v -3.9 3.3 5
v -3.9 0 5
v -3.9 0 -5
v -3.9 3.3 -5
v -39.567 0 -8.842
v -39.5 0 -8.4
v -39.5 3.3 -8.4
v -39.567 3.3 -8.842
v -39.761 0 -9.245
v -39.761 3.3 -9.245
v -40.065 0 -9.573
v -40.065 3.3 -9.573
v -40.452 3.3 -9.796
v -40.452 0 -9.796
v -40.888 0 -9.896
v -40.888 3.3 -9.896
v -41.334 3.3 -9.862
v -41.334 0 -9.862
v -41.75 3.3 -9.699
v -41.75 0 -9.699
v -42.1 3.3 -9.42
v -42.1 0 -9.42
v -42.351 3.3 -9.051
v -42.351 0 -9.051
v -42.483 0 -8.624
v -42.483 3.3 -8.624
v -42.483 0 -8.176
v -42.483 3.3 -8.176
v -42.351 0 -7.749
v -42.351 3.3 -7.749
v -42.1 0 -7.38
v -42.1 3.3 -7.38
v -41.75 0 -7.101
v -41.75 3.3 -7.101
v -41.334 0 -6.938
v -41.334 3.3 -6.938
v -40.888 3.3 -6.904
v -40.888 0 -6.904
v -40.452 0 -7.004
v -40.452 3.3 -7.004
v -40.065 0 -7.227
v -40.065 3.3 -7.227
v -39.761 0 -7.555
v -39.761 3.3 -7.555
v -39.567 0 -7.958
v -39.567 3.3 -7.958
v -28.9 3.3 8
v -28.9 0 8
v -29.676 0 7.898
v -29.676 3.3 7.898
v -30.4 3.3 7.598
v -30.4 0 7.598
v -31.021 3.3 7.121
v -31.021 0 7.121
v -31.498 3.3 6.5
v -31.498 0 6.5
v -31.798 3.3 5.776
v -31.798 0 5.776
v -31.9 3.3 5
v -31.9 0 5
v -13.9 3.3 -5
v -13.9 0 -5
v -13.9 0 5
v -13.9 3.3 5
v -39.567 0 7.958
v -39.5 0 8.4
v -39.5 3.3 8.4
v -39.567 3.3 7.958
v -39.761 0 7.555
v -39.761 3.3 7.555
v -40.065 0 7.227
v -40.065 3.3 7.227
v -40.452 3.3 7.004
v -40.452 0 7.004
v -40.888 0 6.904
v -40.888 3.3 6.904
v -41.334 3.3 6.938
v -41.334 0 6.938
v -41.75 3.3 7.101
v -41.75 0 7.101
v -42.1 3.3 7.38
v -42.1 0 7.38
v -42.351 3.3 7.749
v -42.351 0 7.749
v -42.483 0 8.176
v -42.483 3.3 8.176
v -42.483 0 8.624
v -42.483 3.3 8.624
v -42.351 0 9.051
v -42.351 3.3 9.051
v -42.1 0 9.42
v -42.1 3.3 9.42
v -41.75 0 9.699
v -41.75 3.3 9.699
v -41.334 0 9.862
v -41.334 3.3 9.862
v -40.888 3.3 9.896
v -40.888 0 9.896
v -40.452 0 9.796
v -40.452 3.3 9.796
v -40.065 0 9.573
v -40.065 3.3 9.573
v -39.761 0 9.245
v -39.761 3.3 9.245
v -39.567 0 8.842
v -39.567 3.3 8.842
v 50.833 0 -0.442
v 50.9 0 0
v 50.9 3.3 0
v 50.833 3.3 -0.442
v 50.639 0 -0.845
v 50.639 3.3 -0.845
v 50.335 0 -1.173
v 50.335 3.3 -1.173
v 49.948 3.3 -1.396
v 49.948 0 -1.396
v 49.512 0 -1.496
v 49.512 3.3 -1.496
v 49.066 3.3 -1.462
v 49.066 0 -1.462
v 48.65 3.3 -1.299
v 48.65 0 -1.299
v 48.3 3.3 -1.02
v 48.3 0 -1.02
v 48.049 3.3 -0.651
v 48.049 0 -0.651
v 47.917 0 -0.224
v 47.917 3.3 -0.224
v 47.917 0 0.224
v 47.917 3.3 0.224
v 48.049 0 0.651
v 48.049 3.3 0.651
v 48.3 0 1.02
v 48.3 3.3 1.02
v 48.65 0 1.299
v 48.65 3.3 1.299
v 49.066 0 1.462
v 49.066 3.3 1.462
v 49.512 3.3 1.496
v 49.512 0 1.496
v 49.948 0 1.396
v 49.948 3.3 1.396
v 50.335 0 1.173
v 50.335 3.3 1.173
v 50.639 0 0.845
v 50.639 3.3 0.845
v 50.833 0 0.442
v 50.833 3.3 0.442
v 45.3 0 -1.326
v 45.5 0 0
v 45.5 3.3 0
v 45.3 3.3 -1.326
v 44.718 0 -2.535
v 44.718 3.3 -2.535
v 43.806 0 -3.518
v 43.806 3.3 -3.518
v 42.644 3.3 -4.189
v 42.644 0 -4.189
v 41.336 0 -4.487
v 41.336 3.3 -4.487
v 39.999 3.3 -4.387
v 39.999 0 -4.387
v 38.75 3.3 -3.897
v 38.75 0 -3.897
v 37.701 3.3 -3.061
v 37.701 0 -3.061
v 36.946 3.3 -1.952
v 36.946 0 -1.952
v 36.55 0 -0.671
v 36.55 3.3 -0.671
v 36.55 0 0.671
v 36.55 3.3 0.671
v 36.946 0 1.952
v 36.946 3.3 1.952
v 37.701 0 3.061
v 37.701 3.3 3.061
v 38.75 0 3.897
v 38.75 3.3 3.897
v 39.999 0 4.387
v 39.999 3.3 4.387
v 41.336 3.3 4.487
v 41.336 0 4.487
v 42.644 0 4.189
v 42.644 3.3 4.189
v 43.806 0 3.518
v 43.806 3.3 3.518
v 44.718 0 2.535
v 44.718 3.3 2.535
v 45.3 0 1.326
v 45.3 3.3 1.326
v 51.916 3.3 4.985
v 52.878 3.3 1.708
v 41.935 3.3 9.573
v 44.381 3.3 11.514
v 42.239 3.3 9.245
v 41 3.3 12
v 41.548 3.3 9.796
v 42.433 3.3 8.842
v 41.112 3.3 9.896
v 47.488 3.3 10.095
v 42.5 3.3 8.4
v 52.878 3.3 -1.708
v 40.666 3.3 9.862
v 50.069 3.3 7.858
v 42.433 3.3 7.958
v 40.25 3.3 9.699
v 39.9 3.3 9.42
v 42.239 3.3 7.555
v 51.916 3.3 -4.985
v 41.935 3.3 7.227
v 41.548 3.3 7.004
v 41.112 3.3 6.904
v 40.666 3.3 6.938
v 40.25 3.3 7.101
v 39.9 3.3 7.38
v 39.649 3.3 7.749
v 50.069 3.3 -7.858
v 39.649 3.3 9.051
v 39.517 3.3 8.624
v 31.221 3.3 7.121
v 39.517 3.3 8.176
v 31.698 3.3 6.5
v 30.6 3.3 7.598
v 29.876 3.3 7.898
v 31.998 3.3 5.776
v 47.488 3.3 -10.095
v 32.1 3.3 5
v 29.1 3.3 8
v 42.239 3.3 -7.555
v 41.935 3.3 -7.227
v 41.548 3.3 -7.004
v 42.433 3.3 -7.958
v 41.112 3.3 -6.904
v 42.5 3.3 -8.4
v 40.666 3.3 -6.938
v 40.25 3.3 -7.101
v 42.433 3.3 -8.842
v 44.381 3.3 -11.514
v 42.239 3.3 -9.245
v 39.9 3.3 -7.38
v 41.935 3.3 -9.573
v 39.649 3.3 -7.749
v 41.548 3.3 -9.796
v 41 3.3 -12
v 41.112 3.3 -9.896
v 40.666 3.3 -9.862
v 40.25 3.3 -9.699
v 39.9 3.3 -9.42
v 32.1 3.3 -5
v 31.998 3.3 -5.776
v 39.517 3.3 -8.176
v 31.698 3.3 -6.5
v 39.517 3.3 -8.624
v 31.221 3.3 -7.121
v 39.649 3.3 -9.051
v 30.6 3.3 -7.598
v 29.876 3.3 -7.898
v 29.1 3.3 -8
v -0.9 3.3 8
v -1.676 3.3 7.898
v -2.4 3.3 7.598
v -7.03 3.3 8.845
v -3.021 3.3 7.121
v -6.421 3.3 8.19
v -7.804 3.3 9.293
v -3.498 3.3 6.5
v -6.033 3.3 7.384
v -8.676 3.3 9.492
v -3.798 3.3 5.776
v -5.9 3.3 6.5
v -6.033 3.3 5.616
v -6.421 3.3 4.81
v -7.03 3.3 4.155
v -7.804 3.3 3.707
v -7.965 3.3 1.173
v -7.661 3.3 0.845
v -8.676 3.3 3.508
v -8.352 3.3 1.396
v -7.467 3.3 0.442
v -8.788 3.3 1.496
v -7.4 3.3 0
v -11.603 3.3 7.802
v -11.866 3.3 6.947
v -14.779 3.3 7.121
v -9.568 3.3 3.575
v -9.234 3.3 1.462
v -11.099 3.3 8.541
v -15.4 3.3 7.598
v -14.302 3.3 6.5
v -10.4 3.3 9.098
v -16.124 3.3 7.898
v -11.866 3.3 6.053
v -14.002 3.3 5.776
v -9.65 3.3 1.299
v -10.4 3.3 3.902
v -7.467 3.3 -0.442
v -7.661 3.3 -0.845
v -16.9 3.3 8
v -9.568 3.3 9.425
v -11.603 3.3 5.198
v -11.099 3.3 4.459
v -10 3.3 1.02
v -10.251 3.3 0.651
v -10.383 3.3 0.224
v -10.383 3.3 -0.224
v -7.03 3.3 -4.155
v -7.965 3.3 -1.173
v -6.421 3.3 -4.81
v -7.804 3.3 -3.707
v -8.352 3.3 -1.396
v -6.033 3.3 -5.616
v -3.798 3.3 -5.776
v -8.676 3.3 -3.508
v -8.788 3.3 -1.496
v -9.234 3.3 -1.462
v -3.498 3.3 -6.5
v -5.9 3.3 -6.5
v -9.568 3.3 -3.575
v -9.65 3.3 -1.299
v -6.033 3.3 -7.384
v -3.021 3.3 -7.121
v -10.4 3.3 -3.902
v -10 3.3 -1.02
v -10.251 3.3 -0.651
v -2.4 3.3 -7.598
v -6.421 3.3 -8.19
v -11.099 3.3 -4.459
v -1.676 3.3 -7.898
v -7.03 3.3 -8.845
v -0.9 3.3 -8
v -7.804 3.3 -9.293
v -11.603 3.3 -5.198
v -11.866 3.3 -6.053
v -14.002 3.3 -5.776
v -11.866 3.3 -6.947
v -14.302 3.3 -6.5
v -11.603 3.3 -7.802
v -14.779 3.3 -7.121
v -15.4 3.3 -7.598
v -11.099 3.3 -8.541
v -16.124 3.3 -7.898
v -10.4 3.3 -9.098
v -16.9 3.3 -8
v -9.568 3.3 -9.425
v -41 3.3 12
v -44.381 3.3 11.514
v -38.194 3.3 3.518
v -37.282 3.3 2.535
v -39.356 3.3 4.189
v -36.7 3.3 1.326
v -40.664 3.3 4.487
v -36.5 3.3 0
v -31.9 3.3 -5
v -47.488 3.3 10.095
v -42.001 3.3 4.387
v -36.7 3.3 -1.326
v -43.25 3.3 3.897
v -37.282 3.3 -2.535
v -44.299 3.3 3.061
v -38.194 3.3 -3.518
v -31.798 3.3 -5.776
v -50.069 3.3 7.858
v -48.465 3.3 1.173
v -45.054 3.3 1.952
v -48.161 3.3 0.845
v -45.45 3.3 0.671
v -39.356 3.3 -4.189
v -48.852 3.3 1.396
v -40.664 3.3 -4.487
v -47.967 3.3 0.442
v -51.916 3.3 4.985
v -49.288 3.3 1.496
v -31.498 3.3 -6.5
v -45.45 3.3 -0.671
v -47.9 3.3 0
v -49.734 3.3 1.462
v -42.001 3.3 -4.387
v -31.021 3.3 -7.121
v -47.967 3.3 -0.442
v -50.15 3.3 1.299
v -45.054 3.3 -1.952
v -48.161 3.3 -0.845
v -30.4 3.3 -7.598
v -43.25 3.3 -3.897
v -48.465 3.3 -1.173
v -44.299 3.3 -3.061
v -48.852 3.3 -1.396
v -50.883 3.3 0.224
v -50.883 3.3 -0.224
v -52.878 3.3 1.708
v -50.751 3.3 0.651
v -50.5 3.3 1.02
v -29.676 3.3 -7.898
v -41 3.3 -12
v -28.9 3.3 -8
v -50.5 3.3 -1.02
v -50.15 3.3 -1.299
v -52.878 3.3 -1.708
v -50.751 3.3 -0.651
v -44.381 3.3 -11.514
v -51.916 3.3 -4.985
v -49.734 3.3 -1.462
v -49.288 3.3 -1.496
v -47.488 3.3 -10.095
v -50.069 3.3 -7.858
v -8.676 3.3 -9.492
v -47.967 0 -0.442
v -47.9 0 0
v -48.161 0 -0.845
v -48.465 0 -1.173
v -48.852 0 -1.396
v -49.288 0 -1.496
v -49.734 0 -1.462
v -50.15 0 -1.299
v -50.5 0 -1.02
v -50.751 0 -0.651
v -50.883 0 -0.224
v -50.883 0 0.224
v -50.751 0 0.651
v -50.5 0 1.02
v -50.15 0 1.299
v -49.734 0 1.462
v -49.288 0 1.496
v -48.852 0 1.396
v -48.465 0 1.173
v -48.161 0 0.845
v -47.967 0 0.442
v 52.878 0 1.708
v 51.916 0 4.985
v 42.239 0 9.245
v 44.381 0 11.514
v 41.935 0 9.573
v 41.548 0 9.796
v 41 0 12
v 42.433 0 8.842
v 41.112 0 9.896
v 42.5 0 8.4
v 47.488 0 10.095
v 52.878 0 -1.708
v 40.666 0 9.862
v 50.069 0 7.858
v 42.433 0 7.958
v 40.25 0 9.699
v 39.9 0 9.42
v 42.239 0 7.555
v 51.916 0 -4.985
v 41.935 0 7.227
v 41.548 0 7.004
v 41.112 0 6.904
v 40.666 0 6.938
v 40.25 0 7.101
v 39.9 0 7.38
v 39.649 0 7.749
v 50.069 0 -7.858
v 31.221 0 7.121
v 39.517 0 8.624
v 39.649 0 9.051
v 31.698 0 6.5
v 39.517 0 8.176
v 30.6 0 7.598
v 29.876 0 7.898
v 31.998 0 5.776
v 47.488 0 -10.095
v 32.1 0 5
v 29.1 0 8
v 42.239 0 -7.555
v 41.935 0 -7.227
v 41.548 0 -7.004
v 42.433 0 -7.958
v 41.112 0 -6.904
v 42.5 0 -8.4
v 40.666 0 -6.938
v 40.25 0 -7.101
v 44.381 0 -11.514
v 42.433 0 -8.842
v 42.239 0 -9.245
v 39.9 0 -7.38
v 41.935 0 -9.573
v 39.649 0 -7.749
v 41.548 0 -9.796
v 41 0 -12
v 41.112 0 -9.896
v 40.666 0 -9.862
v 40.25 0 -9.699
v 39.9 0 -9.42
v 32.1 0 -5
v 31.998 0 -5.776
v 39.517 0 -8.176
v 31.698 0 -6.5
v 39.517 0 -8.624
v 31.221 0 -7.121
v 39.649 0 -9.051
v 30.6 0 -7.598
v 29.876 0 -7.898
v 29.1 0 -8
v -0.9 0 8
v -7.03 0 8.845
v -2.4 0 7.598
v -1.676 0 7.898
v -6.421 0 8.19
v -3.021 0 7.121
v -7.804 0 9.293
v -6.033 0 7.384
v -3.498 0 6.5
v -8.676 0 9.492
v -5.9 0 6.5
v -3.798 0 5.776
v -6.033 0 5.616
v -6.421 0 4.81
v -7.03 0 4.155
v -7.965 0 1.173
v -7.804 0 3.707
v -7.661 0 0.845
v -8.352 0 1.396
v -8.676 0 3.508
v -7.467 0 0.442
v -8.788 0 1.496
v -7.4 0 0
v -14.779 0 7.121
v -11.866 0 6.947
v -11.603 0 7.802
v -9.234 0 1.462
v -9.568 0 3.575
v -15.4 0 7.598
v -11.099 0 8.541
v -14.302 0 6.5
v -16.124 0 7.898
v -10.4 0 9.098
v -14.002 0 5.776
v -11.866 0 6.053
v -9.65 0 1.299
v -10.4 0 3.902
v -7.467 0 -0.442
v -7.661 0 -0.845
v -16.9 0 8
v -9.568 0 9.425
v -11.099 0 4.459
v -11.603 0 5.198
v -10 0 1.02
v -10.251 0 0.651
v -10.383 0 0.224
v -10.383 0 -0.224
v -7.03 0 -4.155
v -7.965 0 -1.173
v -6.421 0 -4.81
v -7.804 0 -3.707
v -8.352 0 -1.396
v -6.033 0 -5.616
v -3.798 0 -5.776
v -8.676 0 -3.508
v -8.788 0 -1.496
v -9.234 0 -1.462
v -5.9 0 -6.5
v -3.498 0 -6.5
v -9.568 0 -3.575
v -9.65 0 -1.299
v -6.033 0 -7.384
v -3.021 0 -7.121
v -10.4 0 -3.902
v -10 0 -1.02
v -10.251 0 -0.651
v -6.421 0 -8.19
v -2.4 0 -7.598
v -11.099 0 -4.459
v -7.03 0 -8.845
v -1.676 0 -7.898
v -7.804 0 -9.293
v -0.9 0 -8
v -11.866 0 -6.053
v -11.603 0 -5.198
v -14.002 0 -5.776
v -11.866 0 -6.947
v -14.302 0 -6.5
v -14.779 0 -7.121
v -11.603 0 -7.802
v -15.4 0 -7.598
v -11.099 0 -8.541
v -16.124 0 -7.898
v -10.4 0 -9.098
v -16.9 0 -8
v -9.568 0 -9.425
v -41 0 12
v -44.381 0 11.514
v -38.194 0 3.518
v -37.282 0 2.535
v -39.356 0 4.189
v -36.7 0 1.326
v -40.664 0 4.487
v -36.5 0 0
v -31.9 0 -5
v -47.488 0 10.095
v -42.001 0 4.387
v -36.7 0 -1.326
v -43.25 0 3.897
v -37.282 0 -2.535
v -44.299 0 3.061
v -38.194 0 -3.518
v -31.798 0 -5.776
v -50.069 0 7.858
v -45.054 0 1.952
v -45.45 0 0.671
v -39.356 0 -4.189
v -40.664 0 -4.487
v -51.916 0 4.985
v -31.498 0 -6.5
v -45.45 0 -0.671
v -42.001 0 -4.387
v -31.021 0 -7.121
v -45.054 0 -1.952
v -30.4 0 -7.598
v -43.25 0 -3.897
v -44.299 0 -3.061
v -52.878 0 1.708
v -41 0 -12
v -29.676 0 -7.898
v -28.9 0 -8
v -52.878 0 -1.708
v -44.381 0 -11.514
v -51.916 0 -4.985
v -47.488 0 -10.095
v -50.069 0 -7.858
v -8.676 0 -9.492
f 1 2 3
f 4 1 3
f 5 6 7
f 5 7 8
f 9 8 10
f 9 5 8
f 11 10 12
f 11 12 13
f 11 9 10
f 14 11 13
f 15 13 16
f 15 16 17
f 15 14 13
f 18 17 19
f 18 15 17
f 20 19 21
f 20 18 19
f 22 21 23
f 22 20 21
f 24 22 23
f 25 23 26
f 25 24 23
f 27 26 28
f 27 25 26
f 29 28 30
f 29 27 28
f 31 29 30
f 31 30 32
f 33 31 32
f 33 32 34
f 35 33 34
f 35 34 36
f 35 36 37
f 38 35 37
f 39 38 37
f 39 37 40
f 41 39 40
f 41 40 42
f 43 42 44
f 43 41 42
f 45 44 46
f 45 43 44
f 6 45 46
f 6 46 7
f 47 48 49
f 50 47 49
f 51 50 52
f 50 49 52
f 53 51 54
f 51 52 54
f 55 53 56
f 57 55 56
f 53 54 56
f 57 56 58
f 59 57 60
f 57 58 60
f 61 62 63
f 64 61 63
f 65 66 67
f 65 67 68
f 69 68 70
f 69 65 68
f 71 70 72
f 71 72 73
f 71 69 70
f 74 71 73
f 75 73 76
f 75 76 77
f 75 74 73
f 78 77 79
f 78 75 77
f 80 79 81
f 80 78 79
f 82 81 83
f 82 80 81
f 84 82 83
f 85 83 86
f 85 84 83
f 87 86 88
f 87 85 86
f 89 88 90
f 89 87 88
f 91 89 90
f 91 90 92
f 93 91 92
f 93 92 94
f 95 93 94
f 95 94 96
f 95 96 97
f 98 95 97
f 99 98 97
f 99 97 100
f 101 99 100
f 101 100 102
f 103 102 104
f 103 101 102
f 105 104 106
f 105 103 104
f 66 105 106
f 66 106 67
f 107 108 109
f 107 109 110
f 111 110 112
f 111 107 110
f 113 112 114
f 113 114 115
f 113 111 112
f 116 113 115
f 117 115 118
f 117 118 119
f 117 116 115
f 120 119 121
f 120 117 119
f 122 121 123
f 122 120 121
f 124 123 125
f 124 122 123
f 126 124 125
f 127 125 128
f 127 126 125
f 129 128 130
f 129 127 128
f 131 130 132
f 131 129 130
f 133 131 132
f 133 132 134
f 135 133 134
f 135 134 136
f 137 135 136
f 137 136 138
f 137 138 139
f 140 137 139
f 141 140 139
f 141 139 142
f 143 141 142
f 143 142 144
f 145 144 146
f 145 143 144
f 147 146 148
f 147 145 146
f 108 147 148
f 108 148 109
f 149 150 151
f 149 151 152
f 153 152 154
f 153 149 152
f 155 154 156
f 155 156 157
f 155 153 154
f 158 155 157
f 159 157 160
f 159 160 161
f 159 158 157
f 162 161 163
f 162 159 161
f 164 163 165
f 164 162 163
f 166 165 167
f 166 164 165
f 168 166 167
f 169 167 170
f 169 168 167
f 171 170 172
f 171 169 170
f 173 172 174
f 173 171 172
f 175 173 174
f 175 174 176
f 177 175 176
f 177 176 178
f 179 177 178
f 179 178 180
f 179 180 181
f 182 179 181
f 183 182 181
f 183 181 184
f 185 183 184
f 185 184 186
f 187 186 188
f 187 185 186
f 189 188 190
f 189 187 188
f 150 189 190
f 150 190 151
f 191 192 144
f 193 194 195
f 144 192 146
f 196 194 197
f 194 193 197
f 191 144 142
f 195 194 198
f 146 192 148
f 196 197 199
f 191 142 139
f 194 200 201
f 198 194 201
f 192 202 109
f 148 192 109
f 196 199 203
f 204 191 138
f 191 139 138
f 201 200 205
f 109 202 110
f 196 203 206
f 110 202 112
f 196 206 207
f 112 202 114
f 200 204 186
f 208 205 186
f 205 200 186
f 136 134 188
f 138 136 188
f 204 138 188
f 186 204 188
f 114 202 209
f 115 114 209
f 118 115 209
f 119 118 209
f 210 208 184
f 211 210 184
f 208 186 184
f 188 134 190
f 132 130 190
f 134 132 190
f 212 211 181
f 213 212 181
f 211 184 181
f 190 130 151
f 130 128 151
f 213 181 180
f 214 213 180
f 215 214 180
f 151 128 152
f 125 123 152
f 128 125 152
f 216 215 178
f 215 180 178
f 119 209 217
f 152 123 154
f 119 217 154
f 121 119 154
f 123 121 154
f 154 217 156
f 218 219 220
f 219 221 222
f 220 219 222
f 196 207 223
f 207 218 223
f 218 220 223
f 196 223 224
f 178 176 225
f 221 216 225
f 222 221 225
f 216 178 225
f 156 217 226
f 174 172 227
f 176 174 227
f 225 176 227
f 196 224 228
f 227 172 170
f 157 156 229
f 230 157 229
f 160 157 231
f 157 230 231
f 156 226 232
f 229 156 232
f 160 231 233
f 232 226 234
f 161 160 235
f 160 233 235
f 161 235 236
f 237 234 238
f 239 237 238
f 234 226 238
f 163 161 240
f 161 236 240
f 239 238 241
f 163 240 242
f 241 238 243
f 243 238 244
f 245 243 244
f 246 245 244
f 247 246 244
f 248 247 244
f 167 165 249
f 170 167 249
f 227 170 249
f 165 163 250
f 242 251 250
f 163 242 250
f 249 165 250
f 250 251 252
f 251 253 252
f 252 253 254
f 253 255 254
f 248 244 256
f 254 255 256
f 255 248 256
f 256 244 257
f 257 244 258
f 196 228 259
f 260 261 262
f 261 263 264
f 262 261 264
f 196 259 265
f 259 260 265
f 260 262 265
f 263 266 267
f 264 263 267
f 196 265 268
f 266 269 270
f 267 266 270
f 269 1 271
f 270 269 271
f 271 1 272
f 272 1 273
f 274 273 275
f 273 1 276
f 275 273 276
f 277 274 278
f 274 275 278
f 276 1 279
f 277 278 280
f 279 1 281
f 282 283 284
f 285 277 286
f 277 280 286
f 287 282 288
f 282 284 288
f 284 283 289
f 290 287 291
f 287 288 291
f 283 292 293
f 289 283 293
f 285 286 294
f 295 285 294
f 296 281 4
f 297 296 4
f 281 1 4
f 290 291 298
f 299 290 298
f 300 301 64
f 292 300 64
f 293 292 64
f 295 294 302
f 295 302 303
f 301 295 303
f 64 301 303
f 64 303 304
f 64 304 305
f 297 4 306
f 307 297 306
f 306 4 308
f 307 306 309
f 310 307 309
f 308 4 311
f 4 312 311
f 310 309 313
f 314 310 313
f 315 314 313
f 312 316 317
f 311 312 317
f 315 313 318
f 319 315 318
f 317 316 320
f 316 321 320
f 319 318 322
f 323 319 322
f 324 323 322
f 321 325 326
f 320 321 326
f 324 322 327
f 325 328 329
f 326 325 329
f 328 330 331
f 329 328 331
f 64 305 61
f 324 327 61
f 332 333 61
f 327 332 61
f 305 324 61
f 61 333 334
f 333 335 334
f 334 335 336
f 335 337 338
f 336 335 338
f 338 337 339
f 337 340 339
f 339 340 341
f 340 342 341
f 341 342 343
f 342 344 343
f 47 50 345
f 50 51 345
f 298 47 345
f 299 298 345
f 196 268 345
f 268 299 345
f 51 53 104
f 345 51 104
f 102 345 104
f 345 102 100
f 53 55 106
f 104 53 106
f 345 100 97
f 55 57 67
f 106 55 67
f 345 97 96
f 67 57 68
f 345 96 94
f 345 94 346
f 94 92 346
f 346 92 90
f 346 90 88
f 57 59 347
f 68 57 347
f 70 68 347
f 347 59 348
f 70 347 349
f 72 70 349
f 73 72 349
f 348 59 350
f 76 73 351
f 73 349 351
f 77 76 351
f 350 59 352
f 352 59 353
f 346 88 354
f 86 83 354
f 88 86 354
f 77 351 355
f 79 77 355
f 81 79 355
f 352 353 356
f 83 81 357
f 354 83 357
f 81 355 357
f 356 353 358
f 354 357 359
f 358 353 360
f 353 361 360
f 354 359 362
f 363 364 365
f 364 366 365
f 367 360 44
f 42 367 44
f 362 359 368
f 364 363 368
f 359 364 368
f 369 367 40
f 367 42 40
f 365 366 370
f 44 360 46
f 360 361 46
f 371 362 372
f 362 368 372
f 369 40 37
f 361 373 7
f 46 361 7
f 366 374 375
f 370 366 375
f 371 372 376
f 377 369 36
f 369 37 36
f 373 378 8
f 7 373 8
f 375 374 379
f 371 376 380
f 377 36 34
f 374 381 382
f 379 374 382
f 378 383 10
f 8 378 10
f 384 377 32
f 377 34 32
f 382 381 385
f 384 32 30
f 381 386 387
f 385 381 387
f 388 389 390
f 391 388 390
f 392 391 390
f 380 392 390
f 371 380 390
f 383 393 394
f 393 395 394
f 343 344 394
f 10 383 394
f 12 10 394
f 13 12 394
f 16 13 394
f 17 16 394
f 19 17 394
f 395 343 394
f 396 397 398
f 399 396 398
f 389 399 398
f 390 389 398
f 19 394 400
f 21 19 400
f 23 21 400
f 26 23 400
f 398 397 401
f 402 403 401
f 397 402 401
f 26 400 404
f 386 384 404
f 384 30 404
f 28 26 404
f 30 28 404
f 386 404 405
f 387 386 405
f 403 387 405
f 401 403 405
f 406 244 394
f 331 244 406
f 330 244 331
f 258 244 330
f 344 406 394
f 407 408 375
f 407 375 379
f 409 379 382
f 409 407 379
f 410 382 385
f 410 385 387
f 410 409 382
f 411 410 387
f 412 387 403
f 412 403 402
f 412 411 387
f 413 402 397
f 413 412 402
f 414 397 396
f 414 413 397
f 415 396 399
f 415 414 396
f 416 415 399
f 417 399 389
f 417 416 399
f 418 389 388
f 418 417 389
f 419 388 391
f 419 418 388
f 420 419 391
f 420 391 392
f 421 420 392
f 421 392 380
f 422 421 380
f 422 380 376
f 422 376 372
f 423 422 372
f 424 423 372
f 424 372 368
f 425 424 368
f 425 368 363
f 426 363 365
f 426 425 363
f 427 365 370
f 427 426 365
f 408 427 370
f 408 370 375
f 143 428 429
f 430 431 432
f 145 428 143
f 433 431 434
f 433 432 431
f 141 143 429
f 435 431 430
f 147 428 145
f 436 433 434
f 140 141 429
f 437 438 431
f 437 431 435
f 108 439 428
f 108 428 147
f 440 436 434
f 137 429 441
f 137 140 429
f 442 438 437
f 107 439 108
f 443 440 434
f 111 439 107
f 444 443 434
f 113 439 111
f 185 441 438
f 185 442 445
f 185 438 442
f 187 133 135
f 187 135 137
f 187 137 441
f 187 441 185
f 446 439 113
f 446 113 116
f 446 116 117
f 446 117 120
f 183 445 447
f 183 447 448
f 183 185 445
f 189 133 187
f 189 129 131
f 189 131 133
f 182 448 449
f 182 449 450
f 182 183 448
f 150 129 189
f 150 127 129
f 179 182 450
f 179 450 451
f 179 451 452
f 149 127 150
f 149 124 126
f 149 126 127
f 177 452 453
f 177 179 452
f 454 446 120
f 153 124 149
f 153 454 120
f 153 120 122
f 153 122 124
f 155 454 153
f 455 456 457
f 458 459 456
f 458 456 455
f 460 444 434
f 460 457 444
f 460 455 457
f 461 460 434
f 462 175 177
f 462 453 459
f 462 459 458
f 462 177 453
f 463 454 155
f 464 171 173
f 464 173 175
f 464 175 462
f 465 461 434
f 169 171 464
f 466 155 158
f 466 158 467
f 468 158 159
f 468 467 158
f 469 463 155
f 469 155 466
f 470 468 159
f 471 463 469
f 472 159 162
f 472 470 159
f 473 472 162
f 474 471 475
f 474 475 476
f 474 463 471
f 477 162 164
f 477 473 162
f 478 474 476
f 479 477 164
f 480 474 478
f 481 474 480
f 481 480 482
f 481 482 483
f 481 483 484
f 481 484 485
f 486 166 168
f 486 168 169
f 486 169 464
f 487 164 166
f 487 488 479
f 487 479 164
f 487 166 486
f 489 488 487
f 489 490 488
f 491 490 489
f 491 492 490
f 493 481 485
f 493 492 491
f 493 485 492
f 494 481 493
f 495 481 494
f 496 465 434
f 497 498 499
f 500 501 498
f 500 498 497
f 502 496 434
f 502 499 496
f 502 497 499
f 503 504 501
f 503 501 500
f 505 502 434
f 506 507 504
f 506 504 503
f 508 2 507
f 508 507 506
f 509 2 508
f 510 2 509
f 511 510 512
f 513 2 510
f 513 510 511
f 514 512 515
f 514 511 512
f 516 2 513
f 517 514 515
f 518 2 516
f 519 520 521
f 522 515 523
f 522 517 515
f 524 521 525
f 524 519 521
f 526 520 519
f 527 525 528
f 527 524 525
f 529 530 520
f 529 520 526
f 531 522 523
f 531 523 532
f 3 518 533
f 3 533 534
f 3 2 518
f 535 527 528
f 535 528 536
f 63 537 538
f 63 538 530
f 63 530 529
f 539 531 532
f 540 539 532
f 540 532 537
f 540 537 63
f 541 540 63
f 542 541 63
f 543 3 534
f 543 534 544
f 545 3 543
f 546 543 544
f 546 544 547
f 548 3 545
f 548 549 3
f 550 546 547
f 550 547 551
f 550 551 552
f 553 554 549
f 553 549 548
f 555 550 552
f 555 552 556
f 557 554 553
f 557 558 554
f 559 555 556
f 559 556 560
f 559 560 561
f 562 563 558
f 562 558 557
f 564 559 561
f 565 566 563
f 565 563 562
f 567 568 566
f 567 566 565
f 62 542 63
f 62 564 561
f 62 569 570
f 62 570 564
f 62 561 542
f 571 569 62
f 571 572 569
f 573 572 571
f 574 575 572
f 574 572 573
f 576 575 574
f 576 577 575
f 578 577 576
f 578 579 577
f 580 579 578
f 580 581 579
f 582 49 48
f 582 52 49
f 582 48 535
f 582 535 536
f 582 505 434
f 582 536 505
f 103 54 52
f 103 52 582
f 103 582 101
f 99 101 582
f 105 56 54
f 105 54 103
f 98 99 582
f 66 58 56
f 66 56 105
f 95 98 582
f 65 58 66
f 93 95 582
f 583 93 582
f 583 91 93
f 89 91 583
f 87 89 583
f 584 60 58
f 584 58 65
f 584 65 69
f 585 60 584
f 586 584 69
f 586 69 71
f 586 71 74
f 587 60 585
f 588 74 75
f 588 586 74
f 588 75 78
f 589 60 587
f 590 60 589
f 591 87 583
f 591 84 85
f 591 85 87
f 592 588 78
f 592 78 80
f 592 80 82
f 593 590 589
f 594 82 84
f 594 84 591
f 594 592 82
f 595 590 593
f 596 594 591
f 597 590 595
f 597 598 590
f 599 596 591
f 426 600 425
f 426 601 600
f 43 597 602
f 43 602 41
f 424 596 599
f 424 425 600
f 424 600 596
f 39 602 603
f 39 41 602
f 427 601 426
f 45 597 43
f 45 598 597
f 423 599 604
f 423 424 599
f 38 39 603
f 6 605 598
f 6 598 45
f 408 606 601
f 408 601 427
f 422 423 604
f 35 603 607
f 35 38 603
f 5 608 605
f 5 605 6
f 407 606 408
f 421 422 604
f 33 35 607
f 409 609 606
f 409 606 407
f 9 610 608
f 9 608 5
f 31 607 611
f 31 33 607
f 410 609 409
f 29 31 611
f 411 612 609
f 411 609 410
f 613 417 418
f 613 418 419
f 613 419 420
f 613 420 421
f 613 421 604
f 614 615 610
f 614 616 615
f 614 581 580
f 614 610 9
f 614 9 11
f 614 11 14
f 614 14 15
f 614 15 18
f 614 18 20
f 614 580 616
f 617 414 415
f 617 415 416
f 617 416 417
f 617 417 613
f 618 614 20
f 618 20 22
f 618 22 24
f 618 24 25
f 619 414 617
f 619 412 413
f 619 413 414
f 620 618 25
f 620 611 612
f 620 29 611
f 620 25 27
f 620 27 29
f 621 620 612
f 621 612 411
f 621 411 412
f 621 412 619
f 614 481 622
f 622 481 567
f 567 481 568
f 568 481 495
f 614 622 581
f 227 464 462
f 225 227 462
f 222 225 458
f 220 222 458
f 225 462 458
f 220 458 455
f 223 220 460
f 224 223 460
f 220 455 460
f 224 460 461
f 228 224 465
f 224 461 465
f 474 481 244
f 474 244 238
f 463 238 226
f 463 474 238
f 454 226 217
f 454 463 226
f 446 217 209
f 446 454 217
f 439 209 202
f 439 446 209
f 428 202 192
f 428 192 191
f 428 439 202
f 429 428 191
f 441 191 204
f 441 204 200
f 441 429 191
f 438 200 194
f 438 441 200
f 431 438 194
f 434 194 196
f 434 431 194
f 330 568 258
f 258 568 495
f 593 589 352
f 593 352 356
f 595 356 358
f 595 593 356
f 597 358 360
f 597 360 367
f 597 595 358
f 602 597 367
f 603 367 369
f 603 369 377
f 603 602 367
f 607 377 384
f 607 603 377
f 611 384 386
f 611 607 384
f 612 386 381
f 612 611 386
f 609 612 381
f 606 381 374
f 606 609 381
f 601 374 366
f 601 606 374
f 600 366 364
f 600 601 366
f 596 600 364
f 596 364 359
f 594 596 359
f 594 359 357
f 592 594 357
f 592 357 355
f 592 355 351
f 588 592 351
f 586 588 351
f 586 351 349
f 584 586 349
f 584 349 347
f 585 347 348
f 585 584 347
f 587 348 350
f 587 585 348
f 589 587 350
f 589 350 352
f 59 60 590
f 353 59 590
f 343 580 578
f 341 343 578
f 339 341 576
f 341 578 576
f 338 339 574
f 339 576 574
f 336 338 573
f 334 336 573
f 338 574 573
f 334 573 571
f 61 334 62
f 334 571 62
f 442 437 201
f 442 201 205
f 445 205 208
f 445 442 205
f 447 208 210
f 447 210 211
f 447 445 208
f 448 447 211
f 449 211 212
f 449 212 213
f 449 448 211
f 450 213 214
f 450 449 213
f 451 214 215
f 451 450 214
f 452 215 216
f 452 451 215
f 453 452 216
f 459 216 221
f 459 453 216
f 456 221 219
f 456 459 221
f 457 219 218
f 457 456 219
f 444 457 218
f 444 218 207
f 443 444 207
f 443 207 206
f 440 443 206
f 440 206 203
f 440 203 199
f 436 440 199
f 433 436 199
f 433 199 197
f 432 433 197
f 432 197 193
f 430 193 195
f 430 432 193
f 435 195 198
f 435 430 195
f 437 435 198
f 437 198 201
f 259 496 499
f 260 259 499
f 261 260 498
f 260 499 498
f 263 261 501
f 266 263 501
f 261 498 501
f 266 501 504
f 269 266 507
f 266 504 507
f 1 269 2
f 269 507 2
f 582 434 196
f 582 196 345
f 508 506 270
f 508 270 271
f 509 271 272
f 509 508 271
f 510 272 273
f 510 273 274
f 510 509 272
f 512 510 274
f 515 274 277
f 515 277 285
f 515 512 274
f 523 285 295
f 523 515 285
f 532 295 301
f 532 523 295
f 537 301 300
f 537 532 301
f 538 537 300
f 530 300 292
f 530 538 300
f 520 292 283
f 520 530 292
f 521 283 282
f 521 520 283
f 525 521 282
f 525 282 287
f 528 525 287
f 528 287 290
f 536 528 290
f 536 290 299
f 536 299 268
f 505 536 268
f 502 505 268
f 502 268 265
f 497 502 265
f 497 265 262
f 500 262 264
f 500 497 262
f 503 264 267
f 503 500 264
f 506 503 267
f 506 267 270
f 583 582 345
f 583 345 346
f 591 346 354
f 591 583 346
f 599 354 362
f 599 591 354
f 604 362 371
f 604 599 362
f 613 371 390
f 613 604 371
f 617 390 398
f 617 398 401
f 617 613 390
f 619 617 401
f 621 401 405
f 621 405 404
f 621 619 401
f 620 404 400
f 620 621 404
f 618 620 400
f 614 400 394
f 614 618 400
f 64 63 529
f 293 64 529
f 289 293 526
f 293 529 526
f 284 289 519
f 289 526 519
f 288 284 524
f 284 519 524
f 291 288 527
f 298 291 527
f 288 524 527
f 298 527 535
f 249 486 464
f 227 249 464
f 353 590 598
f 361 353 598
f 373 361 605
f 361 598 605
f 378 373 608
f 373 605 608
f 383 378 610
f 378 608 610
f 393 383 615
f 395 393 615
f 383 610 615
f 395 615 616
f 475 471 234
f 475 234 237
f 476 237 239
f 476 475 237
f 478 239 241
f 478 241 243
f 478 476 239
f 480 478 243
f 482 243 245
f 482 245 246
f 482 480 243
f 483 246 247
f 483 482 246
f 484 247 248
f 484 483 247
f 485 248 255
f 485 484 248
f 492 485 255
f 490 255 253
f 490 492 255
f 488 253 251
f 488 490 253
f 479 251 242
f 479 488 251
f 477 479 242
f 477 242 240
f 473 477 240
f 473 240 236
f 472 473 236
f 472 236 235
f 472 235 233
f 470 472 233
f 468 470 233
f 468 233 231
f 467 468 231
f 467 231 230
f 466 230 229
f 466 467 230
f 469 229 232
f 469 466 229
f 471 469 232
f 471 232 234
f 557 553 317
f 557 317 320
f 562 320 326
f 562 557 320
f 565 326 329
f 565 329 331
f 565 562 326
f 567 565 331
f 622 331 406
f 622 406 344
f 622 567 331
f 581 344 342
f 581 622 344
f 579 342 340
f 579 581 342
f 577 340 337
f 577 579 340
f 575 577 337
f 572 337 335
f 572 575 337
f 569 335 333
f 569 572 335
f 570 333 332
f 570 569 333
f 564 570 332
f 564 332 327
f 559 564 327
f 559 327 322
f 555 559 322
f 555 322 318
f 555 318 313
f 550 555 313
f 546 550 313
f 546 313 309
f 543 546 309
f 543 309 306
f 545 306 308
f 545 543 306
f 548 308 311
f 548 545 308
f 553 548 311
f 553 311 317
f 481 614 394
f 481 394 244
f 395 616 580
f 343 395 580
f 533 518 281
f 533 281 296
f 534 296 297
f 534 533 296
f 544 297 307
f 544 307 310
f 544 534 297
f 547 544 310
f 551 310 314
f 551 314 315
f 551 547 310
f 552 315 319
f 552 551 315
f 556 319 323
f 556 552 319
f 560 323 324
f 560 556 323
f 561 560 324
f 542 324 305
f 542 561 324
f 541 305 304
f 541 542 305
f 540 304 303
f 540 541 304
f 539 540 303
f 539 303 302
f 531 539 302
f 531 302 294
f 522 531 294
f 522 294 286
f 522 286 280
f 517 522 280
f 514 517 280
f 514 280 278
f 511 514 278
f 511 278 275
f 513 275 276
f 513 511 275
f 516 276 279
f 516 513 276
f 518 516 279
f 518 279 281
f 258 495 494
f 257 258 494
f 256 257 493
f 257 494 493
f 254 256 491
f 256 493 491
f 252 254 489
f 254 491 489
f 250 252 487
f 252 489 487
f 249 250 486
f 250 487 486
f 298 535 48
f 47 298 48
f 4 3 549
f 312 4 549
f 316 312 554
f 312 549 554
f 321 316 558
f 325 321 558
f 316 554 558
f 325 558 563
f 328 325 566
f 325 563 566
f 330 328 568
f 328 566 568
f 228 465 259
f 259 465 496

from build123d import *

# Parameters (mm, degrees)
SKETCH1_R           = 4.5
SKETCH1_R_2         = 1.5
SKETCH1_R_3         = 3
BOSS_EXTRUDE1_DEPTH = 3.3


with BuildPart() as part:
    # Sketch1 → Boss-Extrude1 (new body)
    with BuildSketch(Plane(origin=(0, 0, 0), x_dir=(1, 0, 0), z_dir=(0, 1, 0))):
        with BuildLine():
            Line((41, -12), (-41, -12))
            ThreePointArc((-41, -12), (-53, 0), (-41, 12))
            Line((-41, 12), (41, 12))
            ThreePointArc((41, 12), (53, 0), (41, -12))
        make_face()
        with Locations((41, 0)):
            Circle(SKETCH1_R, mode=Mode.SUBTRACT)
        with Locations((41, 8.4)):
            Circle(SKETCH1_R_2, mode=Mode.SUBTRACT)
        with Locations((49.4, 0)):
            Circle(SKETCH1_R_2, mode=Mode.SUBTRACT)
        with Locations((41, -8.4)):
            Circle(SKETCH1_R_2, mode=Mode.SUBTRACT)
        with Locations((-41, -8.4)):
            Circle(SKETCH1_R_2, mode=Mode.SUBTRACT)
        with Locations((-49.4, 0)):
            Circle(SKETCH1_R_2, mode=Mode.SUBTRACT)
        with Locations((-41, 8.4)):
            Circle(SKETCH1_R_2, mode=Mode.SUBTRACT)
        with Locations((-41, 0)):
            Circle(SKETCH1_R, mode=Mode.SUBTRACT)
        with Locations((-8.9, 0)):
            Circle(SKETCH1_R_2, mode=Mode.SUBTRACT)
        with Locations((-8.9, 6.5)):
            Circle(SKETCH1_R_3, mode=Mode.SUBTRACT)
        with Locations((-8.9, -6.5)):
            Circle(SKETCH1_R_3, mode=Mode.SUBTRACT)
        with BuildLine():
            Line((-0.9, 8), (29.1, 8))
            ThreePointArc((29.1, 8), (31.221320344, 7.121320344), (32.1, 5))
            Line((32.1, 5), (32.1, -5))
            ThreePointArc((32.1, -5), (31.221320344, -7.121320344), (29.1, -8))
            Line((29.1, -8), (-0.9, -8))
            ThreePointArc((-0.9, -8), (-3.021320344, -7.121320344), (-3.9, -5))
            Line((-3.9, -5), (-3.9, 5))
            ThreePointArc((-3.9, 5), (-3.021320344, 7.121320344), (-0.9, 8))
        make_face(mode=Mode.SUBTRACT)
        with BuildLine():
            Line((-28.9, 8), (-16.9, 8))
            ThreePointArc((-16.9, 8), (-14.778679656, 7.121320344), (-13.9, 5))
            Line((-13.9, 5), (-13.9, -5))
            ThreePointArc((-13.9, -5), (-14.778679656, -7.121320344), (-16.9, -8))
            Line((-16.9, -8), (-28.9, -8))
            ThreePointArc((-28.9, -8), (-31.021320344, -7.121320344), (-31.9, -5))
            Line((-31.9, -5), (-31.9, 5))
            ThreePointArc((-31.9, 5), (-31.021320344, 7.121320344), (-28.9, 8))
        make_face(mode=Mode.SUBTRACT)
    extrude(amount=BOSS_EXTRUDE1_DEPTH)


solid = part.part
